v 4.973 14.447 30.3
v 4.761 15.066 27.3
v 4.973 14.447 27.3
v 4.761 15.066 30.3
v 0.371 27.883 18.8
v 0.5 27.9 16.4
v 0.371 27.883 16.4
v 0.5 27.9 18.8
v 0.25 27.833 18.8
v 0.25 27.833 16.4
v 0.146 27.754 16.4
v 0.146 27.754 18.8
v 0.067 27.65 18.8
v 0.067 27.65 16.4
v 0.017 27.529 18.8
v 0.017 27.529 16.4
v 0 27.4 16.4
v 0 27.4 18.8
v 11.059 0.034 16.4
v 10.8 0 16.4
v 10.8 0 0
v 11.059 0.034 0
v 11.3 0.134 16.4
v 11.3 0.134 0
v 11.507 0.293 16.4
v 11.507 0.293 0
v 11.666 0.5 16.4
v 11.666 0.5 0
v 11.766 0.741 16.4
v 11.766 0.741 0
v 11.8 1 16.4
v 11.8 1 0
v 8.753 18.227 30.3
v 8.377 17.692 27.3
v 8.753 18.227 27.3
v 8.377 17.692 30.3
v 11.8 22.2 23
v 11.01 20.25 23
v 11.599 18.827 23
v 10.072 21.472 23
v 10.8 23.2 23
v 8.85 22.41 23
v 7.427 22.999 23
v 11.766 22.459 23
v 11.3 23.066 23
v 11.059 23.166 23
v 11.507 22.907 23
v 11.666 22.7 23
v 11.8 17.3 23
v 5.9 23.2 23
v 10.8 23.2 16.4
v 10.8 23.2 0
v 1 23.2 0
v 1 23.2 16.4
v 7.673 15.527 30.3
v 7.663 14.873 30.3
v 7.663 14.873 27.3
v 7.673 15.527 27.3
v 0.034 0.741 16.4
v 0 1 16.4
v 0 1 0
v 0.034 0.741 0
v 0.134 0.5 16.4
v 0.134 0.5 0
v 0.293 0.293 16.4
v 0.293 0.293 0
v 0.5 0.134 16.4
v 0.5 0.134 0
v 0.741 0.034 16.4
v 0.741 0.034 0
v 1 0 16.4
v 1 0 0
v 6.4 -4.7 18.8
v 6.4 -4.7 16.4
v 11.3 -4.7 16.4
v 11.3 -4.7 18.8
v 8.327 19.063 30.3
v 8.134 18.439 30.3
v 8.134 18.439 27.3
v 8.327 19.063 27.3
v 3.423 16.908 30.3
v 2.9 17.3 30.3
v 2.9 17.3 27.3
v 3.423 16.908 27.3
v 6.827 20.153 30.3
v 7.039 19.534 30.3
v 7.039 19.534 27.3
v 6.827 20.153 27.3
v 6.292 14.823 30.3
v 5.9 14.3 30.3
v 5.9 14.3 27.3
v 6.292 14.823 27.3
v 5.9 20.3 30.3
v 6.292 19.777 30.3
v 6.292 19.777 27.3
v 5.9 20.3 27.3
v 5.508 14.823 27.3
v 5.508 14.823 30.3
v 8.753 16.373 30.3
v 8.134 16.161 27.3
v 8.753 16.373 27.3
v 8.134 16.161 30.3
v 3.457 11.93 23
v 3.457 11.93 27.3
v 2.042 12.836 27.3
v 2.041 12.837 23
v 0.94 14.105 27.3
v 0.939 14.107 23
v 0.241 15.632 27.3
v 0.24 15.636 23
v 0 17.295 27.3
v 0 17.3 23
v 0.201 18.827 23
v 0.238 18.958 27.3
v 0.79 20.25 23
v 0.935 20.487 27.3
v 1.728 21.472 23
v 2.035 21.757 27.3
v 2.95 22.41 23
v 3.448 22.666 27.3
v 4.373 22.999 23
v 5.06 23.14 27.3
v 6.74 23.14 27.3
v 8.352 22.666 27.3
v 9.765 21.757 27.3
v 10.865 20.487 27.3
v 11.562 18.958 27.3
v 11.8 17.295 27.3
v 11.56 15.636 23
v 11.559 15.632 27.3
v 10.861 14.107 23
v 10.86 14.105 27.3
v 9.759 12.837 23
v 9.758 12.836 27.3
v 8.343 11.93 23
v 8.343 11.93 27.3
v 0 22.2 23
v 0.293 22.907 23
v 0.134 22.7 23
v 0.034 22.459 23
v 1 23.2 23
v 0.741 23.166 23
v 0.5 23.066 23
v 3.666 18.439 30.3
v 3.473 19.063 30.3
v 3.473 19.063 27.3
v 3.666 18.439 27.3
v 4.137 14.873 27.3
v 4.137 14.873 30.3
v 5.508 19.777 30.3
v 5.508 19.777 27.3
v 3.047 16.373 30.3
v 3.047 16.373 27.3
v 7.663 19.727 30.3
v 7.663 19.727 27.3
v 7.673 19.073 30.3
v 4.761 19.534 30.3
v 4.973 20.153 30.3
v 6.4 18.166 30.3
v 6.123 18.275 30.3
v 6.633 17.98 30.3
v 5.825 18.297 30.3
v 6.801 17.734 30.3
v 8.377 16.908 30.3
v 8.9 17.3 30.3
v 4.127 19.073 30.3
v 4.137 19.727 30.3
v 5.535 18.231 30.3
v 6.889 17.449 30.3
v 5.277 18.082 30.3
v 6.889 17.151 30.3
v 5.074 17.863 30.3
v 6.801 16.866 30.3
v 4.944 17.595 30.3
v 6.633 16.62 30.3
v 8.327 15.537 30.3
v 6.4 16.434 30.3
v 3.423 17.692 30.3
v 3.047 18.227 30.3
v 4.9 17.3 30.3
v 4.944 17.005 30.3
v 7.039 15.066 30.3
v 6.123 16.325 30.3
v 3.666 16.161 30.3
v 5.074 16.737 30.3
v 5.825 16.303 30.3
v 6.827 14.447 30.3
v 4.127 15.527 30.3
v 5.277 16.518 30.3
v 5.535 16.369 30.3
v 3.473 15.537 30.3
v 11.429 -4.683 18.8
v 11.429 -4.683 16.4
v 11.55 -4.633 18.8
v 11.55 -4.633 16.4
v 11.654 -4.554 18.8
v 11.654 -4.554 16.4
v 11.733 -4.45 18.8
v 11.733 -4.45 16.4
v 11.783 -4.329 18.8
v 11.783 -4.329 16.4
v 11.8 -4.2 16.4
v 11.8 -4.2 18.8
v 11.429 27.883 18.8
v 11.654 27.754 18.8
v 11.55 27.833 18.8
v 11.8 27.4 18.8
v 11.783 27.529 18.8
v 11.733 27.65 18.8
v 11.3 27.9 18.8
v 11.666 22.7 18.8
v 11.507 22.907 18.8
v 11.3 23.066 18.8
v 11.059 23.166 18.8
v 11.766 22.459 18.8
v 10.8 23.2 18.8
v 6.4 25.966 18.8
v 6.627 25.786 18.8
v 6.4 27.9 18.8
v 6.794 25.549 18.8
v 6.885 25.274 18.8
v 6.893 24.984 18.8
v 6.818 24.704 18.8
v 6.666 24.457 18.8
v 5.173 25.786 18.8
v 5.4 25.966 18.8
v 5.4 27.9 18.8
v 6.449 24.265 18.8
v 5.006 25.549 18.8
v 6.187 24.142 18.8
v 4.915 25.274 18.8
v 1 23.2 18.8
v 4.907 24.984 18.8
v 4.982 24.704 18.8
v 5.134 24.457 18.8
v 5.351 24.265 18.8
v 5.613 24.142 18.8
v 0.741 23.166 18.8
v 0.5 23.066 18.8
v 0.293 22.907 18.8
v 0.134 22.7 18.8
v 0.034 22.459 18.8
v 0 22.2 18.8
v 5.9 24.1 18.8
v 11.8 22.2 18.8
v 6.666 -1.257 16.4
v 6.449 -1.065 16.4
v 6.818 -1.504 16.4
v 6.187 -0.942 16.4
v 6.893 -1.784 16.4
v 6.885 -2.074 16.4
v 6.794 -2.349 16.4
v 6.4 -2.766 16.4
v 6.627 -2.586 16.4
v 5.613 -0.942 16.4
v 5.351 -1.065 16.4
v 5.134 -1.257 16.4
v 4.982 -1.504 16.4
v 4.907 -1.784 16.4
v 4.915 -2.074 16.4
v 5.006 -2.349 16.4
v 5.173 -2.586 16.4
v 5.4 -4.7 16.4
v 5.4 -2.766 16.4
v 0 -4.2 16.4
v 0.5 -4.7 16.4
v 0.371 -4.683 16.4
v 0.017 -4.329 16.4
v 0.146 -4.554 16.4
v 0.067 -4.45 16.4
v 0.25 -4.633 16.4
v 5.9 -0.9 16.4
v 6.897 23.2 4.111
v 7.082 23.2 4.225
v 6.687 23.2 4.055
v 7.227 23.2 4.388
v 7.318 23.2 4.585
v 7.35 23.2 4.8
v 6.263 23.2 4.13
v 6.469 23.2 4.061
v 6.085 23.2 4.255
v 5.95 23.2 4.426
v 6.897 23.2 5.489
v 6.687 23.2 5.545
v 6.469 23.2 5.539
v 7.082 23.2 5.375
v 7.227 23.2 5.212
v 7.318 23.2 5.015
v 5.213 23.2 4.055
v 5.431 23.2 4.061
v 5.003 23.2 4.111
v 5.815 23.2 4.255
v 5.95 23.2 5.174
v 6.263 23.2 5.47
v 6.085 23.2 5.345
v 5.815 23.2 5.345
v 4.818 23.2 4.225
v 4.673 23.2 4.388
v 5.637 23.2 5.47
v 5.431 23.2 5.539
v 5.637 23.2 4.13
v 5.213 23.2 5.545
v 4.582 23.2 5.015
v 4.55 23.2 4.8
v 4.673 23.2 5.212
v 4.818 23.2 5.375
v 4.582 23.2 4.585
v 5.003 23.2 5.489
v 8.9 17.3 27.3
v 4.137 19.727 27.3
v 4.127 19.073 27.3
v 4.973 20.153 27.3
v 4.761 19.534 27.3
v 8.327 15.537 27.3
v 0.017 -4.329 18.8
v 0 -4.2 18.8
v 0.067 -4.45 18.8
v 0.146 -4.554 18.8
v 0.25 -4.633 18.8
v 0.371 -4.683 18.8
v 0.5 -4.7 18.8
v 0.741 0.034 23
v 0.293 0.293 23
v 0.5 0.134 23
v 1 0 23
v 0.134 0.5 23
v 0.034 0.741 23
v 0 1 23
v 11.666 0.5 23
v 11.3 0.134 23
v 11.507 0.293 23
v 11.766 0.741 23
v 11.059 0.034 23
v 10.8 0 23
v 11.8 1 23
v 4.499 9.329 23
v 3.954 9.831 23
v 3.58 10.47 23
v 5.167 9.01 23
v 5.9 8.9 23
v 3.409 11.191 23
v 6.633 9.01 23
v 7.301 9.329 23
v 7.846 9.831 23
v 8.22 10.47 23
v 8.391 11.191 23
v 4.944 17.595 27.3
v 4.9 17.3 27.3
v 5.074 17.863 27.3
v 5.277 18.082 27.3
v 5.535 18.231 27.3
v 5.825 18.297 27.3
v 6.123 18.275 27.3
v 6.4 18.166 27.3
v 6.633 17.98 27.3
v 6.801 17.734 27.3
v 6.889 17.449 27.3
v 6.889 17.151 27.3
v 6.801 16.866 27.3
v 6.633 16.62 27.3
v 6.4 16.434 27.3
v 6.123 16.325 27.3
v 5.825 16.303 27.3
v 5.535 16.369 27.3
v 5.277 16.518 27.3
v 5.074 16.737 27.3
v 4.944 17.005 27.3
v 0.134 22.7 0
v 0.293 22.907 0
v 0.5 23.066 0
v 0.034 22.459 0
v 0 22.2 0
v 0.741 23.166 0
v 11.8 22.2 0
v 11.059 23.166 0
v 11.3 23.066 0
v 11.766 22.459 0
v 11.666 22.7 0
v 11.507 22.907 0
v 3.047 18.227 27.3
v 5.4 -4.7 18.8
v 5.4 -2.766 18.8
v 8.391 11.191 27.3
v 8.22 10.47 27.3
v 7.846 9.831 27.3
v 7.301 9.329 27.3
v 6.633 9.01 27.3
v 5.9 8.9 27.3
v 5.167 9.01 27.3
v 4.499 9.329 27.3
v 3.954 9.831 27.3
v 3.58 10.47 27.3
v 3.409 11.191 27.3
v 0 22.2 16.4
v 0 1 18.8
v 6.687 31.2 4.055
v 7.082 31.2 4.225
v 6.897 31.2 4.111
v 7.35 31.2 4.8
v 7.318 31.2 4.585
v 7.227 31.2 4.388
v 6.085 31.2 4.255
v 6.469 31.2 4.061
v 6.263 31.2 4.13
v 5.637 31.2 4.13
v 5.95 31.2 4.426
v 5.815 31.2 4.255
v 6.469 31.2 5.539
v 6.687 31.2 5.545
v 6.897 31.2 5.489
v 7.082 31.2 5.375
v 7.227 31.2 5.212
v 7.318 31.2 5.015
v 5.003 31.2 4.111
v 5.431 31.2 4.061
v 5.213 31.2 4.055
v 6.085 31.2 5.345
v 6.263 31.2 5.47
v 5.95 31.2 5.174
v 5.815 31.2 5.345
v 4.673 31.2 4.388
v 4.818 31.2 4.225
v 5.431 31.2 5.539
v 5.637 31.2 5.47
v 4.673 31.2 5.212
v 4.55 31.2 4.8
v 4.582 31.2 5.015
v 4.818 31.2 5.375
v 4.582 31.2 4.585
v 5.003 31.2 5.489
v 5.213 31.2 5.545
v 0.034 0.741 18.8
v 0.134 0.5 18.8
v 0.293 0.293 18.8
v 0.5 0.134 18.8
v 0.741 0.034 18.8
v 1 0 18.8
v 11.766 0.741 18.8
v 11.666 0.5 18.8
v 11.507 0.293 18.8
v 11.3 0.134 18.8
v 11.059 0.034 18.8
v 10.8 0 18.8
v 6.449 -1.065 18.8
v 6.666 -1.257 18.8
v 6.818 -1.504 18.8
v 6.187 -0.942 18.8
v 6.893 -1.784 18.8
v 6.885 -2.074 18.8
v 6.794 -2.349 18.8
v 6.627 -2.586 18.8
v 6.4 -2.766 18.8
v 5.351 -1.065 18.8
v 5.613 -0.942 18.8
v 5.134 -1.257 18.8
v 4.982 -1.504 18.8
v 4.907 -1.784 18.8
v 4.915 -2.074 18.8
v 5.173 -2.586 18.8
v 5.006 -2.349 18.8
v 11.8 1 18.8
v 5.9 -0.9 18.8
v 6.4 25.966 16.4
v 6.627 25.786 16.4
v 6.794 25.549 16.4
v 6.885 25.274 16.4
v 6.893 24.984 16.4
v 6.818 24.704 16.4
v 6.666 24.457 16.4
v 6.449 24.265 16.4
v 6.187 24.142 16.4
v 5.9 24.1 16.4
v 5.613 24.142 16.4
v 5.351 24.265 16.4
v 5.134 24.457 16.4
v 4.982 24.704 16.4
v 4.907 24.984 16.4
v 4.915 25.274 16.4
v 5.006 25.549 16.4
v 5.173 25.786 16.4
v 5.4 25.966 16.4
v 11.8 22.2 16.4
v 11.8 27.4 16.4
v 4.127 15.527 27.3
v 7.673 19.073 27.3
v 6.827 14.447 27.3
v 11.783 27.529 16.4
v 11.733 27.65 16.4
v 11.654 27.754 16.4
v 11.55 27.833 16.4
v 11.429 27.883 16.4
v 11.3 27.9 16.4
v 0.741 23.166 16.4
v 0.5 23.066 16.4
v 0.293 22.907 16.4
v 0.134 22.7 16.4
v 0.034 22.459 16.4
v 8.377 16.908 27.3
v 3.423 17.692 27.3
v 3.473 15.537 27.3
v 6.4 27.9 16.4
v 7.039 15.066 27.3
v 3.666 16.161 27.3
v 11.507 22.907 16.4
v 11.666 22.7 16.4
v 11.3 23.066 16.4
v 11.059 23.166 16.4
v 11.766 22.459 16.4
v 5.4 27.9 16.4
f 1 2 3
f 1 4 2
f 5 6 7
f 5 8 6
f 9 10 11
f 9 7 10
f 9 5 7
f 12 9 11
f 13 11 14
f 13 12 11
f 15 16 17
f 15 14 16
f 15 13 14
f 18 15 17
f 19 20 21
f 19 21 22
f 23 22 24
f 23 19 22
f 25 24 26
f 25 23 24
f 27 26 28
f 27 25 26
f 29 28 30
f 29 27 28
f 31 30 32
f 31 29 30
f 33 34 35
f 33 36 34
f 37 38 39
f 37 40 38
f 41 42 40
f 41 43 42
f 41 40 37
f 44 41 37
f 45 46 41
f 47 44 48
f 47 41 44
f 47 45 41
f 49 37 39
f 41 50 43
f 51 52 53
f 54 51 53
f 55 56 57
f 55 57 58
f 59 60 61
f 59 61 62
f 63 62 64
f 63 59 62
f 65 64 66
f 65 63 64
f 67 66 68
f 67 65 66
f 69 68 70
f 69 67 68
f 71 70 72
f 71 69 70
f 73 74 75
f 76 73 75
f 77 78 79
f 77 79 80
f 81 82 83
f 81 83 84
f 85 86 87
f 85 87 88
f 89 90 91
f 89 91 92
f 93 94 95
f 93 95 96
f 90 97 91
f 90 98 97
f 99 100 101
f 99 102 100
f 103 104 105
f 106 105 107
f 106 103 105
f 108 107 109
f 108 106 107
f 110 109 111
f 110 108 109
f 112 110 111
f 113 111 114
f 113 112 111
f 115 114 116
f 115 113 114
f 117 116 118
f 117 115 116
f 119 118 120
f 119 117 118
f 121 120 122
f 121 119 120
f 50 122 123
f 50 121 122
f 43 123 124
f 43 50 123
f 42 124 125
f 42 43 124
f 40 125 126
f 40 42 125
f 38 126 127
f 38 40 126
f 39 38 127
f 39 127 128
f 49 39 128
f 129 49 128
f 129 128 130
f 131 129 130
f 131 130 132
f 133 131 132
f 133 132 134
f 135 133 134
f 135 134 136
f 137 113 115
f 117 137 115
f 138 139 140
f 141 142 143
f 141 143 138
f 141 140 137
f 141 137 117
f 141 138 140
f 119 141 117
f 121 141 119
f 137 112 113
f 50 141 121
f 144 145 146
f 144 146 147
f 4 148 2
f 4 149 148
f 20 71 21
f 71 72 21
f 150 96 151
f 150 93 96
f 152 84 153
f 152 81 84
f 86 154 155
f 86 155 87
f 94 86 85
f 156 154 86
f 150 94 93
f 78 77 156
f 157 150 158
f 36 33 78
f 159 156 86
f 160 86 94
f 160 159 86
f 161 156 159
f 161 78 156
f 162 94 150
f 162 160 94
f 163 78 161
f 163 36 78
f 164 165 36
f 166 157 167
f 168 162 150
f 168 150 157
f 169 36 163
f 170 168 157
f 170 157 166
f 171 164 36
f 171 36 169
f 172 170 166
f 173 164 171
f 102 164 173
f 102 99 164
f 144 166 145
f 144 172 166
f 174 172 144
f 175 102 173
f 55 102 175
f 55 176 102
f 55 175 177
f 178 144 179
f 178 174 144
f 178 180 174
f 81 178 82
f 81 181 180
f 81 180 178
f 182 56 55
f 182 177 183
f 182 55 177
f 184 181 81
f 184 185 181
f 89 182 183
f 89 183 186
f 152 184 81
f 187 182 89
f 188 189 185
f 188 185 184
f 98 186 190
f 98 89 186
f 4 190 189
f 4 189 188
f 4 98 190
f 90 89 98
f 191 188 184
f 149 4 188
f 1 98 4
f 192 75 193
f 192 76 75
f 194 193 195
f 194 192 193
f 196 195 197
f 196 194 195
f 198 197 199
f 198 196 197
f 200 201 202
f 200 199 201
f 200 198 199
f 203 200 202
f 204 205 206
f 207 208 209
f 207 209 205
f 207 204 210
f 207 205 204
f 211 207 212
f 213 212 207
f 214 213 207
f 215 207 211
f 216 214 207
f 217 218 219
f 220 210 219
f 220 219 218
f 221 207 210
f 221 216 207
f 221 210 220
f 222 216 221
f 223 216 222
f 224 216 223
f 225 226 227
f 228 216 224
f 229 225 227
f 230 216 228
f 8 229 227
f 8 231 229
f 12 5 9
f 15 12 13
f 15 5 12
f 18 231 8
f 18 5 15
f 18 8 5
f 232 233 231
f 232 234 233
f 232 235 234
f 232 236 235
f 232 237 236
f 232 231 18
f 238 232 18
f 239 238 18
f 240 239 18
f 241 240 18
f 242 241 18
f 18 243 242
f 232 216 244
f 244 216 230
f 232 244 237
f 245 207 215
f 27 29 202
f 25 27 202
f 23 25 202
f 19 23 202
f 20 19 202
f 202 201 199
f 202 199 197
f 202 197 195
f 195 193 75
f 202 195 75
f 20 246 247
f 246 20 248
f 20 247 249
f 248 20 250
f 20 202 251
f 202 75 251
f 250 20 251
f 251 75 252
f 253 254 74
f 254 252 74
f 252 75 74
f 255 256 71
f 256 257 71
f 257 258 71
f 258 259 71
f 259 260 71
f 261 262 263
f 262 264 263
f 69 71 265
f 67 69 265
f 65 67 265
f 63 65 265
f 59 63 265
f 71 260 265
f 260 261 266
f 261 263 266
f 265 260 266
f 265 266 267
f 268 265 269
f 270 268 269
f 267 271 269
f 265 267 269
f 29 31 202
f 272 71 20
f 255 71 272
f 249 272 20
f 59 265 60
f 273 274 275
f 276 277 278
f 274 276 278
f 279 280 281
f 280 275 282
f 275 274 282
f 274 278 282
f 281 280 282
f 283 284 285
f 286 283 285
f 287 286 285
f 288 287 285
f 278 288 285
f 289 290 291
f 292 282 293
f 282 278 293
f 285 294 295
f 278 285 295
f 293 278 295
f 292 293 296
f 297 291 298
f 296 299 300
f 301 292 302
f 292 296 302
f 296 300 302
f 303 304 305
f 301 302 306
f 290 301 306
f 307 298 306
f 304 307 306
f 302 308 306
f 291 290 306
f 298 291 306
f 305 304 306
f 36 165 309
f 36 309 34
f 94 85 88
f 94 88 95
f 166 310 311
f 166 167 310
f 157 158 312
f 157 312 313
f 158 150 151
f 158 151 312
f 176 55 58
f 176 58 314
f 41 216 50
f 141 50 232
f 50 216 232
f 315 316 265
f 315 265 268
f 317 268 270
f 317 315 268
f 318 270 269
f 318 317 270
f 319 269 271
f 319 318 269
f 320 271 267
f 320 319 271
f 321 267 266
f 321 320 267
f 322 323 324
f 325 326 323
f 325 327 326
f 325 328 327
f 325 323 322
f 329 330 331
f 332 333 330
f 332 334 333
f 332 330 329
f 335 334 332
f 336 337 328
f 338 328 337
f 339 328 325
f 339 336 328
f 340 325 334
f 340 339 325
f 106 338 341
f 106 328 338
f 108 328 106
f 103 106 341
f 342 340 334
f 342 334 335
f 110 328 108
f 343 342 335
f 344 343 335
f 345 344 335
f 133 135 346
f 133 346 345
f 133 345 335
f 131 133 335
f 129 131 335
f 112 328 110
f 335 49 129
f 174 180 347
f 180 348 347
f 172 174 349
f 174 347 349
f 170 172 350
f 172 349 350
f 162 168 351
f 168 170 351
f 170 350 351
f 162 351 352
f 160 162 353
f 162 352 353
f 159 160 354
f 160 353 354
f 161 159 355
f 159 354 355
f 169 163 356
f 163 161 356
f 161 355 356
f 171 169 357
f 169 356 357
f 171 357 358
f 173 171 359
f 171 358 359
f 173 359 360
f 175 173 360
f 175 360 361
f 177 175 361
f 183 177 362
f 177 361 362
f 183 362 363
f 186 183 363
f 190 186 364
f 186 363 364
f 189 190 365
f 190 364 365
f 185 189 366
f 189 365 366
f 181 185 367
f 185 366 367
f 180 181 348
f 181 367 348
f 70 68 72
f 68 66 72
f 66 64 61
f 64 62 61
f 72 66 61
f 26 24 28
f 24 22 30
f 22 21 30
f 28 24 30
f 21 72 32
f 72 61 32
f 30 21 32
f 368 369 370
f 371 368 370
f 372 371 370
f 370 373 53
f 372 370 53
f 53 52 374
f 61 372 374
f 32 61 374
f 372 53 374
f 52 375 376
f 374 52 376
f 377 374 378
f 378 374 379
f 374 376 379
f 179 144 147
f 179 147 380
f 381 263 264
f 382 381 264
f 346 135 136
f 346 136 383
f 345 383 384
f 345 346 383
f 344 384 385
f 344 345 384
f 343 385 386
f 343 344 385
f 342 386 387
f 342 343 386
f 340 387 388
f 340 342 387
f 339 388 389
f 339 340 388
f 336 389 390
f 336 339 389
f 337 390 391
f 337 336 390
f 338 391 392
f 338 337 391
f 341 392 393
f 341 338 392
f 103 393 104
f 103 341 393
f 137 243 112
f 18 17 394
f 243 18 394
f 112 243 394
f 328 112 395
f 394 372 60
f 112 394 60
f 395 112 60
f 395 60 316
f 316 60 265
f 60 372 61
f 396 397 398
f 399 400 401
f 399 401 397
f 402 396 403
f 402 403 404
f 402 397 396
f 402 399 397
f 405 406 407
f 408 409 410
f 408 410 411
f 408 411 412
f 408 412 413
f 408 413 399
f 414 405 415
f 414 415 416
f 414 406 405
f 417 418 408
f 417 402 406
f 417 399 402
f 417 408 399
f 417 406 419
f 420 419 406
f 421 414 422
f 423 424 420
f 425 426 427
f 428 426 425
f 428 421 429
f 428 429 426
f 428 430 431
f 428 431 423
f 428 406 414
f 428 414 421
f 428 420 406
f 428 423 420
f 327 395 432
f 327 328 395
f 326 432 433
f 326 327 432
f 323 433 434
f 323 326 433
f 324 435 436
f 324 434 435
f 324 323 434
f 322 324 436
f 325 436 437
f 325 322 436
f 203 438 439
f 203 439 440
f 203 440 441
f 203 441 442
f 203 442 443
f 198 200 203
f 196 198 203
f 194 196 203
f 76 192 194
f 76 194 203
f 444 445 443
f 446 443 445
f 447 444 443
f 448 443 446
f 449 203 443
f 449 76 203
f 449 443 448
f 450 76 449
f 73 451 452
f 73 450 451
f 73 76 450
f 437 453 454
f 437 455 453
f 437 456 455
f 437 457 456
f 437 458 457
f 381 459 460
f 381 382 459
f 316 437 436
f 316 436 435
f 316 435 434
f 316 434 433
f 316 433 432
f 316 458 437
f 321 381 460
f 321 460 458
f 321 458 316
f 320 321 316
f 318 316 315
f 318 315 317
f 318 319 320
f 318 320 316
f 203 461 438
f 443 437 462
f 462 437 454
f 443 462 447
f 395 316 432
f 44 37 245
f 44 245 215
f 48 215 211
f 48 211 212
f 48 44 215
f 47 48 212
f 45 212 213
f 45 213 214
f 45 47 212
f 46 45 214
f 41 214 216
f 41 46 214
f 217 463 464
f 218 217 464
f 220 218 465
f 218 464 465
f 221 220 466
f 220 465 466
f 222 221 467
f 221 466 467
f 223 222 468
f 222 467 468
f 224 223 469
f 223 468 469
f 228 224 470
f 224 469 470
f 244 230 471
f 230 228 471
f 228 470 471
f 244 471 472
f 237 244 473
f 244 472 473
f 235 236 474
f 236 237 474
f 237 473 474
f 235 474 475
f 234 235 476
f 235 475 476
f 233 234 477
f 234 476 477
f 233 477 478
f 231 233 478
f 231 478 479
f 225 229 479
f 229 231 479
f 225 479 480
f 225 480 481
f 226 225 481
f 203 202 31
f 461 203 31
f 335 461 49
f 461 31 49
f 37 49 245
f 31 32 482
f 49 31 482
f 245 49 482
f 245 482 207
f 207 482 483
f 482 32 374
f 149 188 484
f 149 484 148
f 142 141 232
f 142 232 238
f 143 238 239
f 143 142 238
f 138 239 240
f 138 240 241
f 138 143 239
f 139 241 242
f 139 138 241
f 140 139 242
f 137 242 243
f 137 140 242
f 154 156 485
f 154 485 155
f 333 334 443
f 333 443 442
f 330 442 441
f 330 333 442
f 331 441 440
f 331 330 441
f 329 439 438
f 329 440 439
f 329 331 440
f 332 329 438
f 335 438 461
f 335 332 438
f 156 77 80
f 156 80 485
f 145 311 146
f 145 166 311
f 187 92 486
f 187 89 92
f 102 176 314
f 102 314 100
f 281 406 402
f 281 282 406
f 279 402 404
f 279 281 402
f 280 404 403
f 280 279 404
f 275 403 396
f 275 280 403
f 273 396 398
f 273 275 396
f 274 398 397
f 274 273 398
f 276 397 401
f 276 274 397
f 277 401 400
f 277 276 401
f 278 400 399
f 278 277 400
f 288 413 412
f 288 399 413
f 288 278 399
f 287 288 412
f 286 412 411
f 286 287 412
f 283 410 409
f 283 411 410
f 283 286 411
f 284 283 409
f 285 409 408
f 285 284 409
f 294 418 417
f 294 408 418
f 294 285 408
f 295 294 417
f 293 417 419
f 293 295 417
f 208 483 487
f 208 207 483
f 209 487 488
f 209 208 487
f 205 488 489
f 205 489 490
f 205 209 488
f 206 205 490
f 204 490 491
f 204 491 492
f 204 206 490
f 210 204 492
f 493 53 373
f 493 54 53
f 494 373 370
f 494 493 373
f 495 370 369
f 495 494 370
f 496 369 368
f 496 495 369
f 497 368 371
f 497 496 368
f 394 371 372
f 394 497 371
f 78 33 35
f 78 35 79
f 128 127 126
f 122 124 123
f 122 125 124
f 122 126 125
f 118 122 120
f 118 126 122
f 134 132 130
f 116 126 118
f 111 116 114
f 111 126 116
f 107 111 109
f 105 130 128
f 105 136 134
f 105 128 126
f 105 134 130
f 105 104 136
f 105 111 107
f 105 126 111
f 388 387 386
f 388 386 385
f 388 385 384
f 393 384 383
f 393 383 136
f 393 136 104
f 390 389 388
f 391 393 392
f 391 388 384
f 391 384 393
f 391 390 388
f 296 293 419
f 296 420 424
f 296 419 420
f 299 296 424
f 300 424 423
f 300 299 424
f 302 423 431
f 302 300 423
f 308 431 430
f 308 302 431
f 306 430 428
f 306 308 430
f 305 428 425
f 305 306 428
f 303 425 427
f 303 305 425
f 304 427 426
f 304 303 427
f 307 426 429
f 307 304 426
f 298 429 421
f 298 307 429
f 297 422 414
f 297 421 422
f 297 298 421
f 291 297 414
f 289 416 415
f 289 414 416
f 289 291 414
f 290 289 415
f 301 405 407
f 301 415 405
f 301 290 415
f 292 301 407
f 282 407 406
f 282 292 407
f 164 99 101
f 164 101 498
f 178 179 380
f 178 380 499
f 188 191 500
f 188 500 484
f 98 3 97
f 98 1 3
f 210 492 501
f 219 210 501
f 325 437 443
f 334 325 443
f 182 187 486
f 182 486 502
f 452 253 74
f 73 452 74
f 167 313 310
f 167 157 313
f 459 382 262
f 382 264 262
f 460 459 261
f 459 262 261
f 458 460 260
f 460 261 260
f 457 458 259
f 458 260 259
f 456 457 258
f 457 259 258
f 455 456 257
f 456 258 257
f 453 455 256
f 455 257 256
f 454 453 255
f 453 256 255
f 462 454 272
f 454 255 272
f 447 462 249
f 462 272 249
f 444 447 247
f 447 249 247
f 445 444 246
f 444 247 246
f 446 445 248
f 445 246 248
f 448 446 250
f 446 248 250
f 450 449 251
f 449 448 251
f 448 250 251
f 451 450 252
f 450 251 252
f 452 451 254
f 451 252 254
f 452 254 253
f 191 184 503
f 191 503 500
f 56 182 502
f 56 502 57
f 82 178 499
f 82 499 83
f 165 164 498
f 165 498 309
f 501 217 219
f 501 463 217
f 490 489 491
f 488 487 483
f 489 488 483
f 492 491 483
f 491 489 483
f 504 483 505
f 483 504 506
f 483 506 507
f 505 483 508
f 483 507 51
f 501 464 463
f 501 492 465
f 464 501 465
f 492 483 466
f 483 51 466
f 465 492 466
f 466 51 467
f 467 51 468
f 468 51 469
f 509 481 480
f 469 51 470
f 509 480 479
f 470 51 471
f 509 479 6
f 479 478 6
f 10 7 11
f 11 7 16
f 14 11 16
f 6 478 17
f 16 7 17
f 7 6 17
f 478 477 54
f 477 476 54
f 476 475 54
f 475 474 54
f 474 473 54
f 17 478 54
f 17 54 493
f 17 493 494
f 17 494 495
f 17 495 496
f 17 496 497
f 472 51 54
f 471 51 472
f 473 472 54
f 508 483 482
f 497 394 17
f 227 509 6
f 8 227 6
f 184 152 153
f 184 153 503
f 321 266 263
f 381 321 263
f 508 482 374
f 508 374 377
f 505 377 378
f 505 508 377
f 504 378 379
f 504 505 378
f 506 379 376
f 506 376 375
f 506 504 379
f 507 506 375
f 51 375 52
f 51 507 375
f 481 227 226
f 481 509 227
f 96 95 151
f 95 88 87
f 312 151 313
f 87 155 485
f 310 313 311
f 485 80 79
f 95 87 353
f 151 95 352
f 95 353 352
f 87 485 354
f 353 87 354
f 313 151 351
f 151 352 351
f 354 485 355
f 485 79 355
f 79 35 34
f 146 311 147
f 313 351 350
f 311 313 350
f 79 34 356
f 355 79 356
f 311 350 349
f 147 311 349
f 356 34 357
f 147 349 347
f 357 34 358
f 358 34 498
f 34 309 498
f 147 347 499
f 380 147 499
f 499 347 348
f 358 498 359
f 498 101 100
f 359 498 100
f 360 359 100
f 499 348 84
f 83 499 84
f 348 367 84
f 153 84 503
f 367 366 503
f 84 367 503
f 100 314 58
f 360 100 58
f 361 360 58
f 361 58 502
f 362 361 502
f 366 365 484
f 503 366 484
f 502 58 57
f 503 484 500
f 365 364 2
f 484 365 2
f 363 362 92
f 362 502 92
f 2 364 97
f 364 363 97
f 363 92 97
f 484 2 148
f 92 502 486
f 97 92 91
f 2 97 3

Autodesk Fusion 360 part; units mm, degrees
sketch "base" plane through (0, 0, 0) normal (0, 0, 1) x (1, 0, 0)
  line L0 (0, 0) -> (11.8, 0)
  line L1 (11.8, 0) -> (11.8, 23.2)
  line L2 (11.8, 23.2) -> (0, 23.2)
  line L3 (0, 23.2) -> (0, 0)
  dimension "d1" = 11.8
  dimension "d2" = 23.2
extrude "Extrude1" add sketch "base" along normal blind 16.4 makes body 1
sketch "tabs" plane through (0, 0, 16.4) normal (0, 0, 1) x (-1, 0, 0)
  line L0 (0, -23.2) -> (0, 0)
  line L1 (0, 0) -> (-11.8, 0)
  line L2 (-11.8, 0) -> (-11.8, -23.2)
  line L3 (-11.8, -23.2) -> (0, -23.2)
  line L4 (0, -11.6) -> (-11.8, -11.6) construction
  line L5 (-11.8, -27.9) -> (0, -27.9)
  line L6 (0, -27.9) -> (0, 4.7)
  line L7 (0, 4.7) -> (-11.8, 4.7)
  line L8 (-11.8, 4.7) -> (-11.8, -27.9)
  line L9 (-11.8, -27.9) -> (0, 4.7) construction
  line L10 (0, -27.9) -> (-11.8, 4.7) construction
  line L11 (-6.4, 2.766) -> (-6.4, 4.7)
  line L12 (-6.4, 4.7) -> (-5.4, 4.7)
  line L13 (-5.4, 4.7) -> (-5.4, 2.766)
  line L14 (-5.9, 1.9) -> (-5.9, 4.7) construction
  arc A0 (-6.4, 2.766) -> (-5.4, 2.766) centre (-5.9, 1.9) ccw
  arc A1 (-5.4, -25.966) -> (-6.4, -25.966) centre (-5.9, -25.1) ccw
  line L15 (-6.4, -25.966) -> (-6.4, -27.9)
  line L16 (-6.4, -27.9) -> (-5.4, -27.9)
  line L17 (-5.4, -27.9) -> (-5.4, -25.966)
  point P0 (-5.9, -11.6)
  dimension "d33" = 32.6
  dimension "d34" = 11.8
  dimension "d35" = 2
  dimension "d36" = 13.5
  dimension "d37" = 1
extrude "Extrude8" add sketch "tabs" along normal blind 2.4 contours L0 L1 L2 L3 L6 L8 | L3 L5 L6 L8 A1 L15 L17 | L1 L6 L7 L8 L11 L13 A0 bodies 1
extrude "Extrude9" add sketch "base" along normal blind 23 bodies 1
sketch "motor" plane through (0, 0, 23) normal (0, 0, 1) x (-1, 0, 0)
  line L0 (0, -23.2) -> (0, 0)
  line L1 (0, 0) -> (-11.8, 0)
  line L2 (-11.8, 0) -> (-11.8, -23.2)
  line L3 (-11.8, -23.2) -> (0, -23.2)
  circle A0 centre (-5.9, -17.3) radius 5.9
  circle A1 centre (-5.9, -11.4) radius 2.5
  dimension "d42" = 11.8
  dimension "d43" = 5
extrude "Extrude10" add sketch "motor" along normal blind 4.3 contours A0 A1 | A0 A1 | A0 A1 bodies 1
sketch "gear" plane through (0, 0, 27.3) normal (0, 0, 1) x (-1, 0, 0)
  arc A0 (-3.4568, -11.9297) -> (-8.3432, -11.9297) centre (-5.9, -11.4) ccw
  arc A1 (-8.3432, -11.9297) -> (-3.4568, -11.9297) centre (-5.9, -17.3) ccw
  circle A2 centre (-5.9, -17.3) radius 2.4
  circle A3 centre (-5.9, -17.3) radius 1
  dimension "d46" = 4.8
  dimension "d47" = 2
extrude "Extrude11" add sketch "gear" along normal blind 3 separate body contours A2 makes body 2
sketch "tooth" plane through (0, 0, 30.3) normal (0, 0, 1) x (-1, 0, 0)
  circle A0 centre (-5.9, -17.3) radius 1
  circle A1 centre (-5.9, -17.3) radius 2.4
  line L0 (-5.9, -17.3) -> (-5.9, -28.5) construction
  line L1 (-5.15, -19.3) -> (-6.65, -19.3)
  line L2 (-6.65, -19.3) -> (-5.9, -20.3)
  line L3 (-5.9, -20.3) -> (-5.15, -19.3)
  line L4 (-5.9, -20.3) -> (-5.9, -19.3) construction
  dimension "d50" = 1
  dimension "d51" = 1.5
  dimension "d56" = 2
extrude "Extrude12" add sketch "tooth" against normal up to surface (3 mm away) contours A1 L2 L3 bodies 2
pattern_circular "C-Pattern2" count 20 over 360 about axis through (5.9, 17.3, 30.3) along (0, 0, -1) of "Extrude12"
fillet "Fillet2" radius 1 8 edges at (11.8, 0, 20.9) (0, 0, 20.9) (11.8, 0, 8.2) (0, 0, 8.2) (11.8, 23.2, 8.2) (11.8, 23.2, 20.9) (0, 23.2, 20.9) (0, 23.2, 8.2) on bodies 1
fillet "Fillet3" radius 0.5 4 edges at (0, -4.7, 17.6) (11.8, -4.7, 17.6) (11.8, 27.9, 17.6) (0, 27.9, 17.6) on bodies 1
sketch "Sketch10" plane through (0, 23.2, 0) normal (0, 1, 0) x (-1, 0, 0)
  line L0 (-1, 0) -> (-1, 16.4)
  line L1 (-1, 16.4) -> (-10.8, 16.4)
  line L2 (-10.8, 16.4) -> (-10.8, 0)
  line L3 (-10.8, 0) -> (-1, 0)
  line L4 (-10.8, 4.8) -> (-1, 4.8) construction
  arc A0 (-5.95, 4.4258) -> (-5.95, 5.1742) centre (-5.3, 4.8) ccw
  arc A1 (-5.95, 5.1742) -> (-5.95, 4.4258) centre (-6.6, 4.8) ccw
  dimension "d59" = 4.8
  dimension "d60" = 1.5
  dimension "d61" = 1.5
extrude "Extrude13" add sketch "Sketch10" along normal blind 8 separate body contours A0 A1 makes body 3
equation "d36 = ( 27 / 2 ) * 1 mm"
equation "d46 = ( 2.4 * 2 ) * 1 mm"
